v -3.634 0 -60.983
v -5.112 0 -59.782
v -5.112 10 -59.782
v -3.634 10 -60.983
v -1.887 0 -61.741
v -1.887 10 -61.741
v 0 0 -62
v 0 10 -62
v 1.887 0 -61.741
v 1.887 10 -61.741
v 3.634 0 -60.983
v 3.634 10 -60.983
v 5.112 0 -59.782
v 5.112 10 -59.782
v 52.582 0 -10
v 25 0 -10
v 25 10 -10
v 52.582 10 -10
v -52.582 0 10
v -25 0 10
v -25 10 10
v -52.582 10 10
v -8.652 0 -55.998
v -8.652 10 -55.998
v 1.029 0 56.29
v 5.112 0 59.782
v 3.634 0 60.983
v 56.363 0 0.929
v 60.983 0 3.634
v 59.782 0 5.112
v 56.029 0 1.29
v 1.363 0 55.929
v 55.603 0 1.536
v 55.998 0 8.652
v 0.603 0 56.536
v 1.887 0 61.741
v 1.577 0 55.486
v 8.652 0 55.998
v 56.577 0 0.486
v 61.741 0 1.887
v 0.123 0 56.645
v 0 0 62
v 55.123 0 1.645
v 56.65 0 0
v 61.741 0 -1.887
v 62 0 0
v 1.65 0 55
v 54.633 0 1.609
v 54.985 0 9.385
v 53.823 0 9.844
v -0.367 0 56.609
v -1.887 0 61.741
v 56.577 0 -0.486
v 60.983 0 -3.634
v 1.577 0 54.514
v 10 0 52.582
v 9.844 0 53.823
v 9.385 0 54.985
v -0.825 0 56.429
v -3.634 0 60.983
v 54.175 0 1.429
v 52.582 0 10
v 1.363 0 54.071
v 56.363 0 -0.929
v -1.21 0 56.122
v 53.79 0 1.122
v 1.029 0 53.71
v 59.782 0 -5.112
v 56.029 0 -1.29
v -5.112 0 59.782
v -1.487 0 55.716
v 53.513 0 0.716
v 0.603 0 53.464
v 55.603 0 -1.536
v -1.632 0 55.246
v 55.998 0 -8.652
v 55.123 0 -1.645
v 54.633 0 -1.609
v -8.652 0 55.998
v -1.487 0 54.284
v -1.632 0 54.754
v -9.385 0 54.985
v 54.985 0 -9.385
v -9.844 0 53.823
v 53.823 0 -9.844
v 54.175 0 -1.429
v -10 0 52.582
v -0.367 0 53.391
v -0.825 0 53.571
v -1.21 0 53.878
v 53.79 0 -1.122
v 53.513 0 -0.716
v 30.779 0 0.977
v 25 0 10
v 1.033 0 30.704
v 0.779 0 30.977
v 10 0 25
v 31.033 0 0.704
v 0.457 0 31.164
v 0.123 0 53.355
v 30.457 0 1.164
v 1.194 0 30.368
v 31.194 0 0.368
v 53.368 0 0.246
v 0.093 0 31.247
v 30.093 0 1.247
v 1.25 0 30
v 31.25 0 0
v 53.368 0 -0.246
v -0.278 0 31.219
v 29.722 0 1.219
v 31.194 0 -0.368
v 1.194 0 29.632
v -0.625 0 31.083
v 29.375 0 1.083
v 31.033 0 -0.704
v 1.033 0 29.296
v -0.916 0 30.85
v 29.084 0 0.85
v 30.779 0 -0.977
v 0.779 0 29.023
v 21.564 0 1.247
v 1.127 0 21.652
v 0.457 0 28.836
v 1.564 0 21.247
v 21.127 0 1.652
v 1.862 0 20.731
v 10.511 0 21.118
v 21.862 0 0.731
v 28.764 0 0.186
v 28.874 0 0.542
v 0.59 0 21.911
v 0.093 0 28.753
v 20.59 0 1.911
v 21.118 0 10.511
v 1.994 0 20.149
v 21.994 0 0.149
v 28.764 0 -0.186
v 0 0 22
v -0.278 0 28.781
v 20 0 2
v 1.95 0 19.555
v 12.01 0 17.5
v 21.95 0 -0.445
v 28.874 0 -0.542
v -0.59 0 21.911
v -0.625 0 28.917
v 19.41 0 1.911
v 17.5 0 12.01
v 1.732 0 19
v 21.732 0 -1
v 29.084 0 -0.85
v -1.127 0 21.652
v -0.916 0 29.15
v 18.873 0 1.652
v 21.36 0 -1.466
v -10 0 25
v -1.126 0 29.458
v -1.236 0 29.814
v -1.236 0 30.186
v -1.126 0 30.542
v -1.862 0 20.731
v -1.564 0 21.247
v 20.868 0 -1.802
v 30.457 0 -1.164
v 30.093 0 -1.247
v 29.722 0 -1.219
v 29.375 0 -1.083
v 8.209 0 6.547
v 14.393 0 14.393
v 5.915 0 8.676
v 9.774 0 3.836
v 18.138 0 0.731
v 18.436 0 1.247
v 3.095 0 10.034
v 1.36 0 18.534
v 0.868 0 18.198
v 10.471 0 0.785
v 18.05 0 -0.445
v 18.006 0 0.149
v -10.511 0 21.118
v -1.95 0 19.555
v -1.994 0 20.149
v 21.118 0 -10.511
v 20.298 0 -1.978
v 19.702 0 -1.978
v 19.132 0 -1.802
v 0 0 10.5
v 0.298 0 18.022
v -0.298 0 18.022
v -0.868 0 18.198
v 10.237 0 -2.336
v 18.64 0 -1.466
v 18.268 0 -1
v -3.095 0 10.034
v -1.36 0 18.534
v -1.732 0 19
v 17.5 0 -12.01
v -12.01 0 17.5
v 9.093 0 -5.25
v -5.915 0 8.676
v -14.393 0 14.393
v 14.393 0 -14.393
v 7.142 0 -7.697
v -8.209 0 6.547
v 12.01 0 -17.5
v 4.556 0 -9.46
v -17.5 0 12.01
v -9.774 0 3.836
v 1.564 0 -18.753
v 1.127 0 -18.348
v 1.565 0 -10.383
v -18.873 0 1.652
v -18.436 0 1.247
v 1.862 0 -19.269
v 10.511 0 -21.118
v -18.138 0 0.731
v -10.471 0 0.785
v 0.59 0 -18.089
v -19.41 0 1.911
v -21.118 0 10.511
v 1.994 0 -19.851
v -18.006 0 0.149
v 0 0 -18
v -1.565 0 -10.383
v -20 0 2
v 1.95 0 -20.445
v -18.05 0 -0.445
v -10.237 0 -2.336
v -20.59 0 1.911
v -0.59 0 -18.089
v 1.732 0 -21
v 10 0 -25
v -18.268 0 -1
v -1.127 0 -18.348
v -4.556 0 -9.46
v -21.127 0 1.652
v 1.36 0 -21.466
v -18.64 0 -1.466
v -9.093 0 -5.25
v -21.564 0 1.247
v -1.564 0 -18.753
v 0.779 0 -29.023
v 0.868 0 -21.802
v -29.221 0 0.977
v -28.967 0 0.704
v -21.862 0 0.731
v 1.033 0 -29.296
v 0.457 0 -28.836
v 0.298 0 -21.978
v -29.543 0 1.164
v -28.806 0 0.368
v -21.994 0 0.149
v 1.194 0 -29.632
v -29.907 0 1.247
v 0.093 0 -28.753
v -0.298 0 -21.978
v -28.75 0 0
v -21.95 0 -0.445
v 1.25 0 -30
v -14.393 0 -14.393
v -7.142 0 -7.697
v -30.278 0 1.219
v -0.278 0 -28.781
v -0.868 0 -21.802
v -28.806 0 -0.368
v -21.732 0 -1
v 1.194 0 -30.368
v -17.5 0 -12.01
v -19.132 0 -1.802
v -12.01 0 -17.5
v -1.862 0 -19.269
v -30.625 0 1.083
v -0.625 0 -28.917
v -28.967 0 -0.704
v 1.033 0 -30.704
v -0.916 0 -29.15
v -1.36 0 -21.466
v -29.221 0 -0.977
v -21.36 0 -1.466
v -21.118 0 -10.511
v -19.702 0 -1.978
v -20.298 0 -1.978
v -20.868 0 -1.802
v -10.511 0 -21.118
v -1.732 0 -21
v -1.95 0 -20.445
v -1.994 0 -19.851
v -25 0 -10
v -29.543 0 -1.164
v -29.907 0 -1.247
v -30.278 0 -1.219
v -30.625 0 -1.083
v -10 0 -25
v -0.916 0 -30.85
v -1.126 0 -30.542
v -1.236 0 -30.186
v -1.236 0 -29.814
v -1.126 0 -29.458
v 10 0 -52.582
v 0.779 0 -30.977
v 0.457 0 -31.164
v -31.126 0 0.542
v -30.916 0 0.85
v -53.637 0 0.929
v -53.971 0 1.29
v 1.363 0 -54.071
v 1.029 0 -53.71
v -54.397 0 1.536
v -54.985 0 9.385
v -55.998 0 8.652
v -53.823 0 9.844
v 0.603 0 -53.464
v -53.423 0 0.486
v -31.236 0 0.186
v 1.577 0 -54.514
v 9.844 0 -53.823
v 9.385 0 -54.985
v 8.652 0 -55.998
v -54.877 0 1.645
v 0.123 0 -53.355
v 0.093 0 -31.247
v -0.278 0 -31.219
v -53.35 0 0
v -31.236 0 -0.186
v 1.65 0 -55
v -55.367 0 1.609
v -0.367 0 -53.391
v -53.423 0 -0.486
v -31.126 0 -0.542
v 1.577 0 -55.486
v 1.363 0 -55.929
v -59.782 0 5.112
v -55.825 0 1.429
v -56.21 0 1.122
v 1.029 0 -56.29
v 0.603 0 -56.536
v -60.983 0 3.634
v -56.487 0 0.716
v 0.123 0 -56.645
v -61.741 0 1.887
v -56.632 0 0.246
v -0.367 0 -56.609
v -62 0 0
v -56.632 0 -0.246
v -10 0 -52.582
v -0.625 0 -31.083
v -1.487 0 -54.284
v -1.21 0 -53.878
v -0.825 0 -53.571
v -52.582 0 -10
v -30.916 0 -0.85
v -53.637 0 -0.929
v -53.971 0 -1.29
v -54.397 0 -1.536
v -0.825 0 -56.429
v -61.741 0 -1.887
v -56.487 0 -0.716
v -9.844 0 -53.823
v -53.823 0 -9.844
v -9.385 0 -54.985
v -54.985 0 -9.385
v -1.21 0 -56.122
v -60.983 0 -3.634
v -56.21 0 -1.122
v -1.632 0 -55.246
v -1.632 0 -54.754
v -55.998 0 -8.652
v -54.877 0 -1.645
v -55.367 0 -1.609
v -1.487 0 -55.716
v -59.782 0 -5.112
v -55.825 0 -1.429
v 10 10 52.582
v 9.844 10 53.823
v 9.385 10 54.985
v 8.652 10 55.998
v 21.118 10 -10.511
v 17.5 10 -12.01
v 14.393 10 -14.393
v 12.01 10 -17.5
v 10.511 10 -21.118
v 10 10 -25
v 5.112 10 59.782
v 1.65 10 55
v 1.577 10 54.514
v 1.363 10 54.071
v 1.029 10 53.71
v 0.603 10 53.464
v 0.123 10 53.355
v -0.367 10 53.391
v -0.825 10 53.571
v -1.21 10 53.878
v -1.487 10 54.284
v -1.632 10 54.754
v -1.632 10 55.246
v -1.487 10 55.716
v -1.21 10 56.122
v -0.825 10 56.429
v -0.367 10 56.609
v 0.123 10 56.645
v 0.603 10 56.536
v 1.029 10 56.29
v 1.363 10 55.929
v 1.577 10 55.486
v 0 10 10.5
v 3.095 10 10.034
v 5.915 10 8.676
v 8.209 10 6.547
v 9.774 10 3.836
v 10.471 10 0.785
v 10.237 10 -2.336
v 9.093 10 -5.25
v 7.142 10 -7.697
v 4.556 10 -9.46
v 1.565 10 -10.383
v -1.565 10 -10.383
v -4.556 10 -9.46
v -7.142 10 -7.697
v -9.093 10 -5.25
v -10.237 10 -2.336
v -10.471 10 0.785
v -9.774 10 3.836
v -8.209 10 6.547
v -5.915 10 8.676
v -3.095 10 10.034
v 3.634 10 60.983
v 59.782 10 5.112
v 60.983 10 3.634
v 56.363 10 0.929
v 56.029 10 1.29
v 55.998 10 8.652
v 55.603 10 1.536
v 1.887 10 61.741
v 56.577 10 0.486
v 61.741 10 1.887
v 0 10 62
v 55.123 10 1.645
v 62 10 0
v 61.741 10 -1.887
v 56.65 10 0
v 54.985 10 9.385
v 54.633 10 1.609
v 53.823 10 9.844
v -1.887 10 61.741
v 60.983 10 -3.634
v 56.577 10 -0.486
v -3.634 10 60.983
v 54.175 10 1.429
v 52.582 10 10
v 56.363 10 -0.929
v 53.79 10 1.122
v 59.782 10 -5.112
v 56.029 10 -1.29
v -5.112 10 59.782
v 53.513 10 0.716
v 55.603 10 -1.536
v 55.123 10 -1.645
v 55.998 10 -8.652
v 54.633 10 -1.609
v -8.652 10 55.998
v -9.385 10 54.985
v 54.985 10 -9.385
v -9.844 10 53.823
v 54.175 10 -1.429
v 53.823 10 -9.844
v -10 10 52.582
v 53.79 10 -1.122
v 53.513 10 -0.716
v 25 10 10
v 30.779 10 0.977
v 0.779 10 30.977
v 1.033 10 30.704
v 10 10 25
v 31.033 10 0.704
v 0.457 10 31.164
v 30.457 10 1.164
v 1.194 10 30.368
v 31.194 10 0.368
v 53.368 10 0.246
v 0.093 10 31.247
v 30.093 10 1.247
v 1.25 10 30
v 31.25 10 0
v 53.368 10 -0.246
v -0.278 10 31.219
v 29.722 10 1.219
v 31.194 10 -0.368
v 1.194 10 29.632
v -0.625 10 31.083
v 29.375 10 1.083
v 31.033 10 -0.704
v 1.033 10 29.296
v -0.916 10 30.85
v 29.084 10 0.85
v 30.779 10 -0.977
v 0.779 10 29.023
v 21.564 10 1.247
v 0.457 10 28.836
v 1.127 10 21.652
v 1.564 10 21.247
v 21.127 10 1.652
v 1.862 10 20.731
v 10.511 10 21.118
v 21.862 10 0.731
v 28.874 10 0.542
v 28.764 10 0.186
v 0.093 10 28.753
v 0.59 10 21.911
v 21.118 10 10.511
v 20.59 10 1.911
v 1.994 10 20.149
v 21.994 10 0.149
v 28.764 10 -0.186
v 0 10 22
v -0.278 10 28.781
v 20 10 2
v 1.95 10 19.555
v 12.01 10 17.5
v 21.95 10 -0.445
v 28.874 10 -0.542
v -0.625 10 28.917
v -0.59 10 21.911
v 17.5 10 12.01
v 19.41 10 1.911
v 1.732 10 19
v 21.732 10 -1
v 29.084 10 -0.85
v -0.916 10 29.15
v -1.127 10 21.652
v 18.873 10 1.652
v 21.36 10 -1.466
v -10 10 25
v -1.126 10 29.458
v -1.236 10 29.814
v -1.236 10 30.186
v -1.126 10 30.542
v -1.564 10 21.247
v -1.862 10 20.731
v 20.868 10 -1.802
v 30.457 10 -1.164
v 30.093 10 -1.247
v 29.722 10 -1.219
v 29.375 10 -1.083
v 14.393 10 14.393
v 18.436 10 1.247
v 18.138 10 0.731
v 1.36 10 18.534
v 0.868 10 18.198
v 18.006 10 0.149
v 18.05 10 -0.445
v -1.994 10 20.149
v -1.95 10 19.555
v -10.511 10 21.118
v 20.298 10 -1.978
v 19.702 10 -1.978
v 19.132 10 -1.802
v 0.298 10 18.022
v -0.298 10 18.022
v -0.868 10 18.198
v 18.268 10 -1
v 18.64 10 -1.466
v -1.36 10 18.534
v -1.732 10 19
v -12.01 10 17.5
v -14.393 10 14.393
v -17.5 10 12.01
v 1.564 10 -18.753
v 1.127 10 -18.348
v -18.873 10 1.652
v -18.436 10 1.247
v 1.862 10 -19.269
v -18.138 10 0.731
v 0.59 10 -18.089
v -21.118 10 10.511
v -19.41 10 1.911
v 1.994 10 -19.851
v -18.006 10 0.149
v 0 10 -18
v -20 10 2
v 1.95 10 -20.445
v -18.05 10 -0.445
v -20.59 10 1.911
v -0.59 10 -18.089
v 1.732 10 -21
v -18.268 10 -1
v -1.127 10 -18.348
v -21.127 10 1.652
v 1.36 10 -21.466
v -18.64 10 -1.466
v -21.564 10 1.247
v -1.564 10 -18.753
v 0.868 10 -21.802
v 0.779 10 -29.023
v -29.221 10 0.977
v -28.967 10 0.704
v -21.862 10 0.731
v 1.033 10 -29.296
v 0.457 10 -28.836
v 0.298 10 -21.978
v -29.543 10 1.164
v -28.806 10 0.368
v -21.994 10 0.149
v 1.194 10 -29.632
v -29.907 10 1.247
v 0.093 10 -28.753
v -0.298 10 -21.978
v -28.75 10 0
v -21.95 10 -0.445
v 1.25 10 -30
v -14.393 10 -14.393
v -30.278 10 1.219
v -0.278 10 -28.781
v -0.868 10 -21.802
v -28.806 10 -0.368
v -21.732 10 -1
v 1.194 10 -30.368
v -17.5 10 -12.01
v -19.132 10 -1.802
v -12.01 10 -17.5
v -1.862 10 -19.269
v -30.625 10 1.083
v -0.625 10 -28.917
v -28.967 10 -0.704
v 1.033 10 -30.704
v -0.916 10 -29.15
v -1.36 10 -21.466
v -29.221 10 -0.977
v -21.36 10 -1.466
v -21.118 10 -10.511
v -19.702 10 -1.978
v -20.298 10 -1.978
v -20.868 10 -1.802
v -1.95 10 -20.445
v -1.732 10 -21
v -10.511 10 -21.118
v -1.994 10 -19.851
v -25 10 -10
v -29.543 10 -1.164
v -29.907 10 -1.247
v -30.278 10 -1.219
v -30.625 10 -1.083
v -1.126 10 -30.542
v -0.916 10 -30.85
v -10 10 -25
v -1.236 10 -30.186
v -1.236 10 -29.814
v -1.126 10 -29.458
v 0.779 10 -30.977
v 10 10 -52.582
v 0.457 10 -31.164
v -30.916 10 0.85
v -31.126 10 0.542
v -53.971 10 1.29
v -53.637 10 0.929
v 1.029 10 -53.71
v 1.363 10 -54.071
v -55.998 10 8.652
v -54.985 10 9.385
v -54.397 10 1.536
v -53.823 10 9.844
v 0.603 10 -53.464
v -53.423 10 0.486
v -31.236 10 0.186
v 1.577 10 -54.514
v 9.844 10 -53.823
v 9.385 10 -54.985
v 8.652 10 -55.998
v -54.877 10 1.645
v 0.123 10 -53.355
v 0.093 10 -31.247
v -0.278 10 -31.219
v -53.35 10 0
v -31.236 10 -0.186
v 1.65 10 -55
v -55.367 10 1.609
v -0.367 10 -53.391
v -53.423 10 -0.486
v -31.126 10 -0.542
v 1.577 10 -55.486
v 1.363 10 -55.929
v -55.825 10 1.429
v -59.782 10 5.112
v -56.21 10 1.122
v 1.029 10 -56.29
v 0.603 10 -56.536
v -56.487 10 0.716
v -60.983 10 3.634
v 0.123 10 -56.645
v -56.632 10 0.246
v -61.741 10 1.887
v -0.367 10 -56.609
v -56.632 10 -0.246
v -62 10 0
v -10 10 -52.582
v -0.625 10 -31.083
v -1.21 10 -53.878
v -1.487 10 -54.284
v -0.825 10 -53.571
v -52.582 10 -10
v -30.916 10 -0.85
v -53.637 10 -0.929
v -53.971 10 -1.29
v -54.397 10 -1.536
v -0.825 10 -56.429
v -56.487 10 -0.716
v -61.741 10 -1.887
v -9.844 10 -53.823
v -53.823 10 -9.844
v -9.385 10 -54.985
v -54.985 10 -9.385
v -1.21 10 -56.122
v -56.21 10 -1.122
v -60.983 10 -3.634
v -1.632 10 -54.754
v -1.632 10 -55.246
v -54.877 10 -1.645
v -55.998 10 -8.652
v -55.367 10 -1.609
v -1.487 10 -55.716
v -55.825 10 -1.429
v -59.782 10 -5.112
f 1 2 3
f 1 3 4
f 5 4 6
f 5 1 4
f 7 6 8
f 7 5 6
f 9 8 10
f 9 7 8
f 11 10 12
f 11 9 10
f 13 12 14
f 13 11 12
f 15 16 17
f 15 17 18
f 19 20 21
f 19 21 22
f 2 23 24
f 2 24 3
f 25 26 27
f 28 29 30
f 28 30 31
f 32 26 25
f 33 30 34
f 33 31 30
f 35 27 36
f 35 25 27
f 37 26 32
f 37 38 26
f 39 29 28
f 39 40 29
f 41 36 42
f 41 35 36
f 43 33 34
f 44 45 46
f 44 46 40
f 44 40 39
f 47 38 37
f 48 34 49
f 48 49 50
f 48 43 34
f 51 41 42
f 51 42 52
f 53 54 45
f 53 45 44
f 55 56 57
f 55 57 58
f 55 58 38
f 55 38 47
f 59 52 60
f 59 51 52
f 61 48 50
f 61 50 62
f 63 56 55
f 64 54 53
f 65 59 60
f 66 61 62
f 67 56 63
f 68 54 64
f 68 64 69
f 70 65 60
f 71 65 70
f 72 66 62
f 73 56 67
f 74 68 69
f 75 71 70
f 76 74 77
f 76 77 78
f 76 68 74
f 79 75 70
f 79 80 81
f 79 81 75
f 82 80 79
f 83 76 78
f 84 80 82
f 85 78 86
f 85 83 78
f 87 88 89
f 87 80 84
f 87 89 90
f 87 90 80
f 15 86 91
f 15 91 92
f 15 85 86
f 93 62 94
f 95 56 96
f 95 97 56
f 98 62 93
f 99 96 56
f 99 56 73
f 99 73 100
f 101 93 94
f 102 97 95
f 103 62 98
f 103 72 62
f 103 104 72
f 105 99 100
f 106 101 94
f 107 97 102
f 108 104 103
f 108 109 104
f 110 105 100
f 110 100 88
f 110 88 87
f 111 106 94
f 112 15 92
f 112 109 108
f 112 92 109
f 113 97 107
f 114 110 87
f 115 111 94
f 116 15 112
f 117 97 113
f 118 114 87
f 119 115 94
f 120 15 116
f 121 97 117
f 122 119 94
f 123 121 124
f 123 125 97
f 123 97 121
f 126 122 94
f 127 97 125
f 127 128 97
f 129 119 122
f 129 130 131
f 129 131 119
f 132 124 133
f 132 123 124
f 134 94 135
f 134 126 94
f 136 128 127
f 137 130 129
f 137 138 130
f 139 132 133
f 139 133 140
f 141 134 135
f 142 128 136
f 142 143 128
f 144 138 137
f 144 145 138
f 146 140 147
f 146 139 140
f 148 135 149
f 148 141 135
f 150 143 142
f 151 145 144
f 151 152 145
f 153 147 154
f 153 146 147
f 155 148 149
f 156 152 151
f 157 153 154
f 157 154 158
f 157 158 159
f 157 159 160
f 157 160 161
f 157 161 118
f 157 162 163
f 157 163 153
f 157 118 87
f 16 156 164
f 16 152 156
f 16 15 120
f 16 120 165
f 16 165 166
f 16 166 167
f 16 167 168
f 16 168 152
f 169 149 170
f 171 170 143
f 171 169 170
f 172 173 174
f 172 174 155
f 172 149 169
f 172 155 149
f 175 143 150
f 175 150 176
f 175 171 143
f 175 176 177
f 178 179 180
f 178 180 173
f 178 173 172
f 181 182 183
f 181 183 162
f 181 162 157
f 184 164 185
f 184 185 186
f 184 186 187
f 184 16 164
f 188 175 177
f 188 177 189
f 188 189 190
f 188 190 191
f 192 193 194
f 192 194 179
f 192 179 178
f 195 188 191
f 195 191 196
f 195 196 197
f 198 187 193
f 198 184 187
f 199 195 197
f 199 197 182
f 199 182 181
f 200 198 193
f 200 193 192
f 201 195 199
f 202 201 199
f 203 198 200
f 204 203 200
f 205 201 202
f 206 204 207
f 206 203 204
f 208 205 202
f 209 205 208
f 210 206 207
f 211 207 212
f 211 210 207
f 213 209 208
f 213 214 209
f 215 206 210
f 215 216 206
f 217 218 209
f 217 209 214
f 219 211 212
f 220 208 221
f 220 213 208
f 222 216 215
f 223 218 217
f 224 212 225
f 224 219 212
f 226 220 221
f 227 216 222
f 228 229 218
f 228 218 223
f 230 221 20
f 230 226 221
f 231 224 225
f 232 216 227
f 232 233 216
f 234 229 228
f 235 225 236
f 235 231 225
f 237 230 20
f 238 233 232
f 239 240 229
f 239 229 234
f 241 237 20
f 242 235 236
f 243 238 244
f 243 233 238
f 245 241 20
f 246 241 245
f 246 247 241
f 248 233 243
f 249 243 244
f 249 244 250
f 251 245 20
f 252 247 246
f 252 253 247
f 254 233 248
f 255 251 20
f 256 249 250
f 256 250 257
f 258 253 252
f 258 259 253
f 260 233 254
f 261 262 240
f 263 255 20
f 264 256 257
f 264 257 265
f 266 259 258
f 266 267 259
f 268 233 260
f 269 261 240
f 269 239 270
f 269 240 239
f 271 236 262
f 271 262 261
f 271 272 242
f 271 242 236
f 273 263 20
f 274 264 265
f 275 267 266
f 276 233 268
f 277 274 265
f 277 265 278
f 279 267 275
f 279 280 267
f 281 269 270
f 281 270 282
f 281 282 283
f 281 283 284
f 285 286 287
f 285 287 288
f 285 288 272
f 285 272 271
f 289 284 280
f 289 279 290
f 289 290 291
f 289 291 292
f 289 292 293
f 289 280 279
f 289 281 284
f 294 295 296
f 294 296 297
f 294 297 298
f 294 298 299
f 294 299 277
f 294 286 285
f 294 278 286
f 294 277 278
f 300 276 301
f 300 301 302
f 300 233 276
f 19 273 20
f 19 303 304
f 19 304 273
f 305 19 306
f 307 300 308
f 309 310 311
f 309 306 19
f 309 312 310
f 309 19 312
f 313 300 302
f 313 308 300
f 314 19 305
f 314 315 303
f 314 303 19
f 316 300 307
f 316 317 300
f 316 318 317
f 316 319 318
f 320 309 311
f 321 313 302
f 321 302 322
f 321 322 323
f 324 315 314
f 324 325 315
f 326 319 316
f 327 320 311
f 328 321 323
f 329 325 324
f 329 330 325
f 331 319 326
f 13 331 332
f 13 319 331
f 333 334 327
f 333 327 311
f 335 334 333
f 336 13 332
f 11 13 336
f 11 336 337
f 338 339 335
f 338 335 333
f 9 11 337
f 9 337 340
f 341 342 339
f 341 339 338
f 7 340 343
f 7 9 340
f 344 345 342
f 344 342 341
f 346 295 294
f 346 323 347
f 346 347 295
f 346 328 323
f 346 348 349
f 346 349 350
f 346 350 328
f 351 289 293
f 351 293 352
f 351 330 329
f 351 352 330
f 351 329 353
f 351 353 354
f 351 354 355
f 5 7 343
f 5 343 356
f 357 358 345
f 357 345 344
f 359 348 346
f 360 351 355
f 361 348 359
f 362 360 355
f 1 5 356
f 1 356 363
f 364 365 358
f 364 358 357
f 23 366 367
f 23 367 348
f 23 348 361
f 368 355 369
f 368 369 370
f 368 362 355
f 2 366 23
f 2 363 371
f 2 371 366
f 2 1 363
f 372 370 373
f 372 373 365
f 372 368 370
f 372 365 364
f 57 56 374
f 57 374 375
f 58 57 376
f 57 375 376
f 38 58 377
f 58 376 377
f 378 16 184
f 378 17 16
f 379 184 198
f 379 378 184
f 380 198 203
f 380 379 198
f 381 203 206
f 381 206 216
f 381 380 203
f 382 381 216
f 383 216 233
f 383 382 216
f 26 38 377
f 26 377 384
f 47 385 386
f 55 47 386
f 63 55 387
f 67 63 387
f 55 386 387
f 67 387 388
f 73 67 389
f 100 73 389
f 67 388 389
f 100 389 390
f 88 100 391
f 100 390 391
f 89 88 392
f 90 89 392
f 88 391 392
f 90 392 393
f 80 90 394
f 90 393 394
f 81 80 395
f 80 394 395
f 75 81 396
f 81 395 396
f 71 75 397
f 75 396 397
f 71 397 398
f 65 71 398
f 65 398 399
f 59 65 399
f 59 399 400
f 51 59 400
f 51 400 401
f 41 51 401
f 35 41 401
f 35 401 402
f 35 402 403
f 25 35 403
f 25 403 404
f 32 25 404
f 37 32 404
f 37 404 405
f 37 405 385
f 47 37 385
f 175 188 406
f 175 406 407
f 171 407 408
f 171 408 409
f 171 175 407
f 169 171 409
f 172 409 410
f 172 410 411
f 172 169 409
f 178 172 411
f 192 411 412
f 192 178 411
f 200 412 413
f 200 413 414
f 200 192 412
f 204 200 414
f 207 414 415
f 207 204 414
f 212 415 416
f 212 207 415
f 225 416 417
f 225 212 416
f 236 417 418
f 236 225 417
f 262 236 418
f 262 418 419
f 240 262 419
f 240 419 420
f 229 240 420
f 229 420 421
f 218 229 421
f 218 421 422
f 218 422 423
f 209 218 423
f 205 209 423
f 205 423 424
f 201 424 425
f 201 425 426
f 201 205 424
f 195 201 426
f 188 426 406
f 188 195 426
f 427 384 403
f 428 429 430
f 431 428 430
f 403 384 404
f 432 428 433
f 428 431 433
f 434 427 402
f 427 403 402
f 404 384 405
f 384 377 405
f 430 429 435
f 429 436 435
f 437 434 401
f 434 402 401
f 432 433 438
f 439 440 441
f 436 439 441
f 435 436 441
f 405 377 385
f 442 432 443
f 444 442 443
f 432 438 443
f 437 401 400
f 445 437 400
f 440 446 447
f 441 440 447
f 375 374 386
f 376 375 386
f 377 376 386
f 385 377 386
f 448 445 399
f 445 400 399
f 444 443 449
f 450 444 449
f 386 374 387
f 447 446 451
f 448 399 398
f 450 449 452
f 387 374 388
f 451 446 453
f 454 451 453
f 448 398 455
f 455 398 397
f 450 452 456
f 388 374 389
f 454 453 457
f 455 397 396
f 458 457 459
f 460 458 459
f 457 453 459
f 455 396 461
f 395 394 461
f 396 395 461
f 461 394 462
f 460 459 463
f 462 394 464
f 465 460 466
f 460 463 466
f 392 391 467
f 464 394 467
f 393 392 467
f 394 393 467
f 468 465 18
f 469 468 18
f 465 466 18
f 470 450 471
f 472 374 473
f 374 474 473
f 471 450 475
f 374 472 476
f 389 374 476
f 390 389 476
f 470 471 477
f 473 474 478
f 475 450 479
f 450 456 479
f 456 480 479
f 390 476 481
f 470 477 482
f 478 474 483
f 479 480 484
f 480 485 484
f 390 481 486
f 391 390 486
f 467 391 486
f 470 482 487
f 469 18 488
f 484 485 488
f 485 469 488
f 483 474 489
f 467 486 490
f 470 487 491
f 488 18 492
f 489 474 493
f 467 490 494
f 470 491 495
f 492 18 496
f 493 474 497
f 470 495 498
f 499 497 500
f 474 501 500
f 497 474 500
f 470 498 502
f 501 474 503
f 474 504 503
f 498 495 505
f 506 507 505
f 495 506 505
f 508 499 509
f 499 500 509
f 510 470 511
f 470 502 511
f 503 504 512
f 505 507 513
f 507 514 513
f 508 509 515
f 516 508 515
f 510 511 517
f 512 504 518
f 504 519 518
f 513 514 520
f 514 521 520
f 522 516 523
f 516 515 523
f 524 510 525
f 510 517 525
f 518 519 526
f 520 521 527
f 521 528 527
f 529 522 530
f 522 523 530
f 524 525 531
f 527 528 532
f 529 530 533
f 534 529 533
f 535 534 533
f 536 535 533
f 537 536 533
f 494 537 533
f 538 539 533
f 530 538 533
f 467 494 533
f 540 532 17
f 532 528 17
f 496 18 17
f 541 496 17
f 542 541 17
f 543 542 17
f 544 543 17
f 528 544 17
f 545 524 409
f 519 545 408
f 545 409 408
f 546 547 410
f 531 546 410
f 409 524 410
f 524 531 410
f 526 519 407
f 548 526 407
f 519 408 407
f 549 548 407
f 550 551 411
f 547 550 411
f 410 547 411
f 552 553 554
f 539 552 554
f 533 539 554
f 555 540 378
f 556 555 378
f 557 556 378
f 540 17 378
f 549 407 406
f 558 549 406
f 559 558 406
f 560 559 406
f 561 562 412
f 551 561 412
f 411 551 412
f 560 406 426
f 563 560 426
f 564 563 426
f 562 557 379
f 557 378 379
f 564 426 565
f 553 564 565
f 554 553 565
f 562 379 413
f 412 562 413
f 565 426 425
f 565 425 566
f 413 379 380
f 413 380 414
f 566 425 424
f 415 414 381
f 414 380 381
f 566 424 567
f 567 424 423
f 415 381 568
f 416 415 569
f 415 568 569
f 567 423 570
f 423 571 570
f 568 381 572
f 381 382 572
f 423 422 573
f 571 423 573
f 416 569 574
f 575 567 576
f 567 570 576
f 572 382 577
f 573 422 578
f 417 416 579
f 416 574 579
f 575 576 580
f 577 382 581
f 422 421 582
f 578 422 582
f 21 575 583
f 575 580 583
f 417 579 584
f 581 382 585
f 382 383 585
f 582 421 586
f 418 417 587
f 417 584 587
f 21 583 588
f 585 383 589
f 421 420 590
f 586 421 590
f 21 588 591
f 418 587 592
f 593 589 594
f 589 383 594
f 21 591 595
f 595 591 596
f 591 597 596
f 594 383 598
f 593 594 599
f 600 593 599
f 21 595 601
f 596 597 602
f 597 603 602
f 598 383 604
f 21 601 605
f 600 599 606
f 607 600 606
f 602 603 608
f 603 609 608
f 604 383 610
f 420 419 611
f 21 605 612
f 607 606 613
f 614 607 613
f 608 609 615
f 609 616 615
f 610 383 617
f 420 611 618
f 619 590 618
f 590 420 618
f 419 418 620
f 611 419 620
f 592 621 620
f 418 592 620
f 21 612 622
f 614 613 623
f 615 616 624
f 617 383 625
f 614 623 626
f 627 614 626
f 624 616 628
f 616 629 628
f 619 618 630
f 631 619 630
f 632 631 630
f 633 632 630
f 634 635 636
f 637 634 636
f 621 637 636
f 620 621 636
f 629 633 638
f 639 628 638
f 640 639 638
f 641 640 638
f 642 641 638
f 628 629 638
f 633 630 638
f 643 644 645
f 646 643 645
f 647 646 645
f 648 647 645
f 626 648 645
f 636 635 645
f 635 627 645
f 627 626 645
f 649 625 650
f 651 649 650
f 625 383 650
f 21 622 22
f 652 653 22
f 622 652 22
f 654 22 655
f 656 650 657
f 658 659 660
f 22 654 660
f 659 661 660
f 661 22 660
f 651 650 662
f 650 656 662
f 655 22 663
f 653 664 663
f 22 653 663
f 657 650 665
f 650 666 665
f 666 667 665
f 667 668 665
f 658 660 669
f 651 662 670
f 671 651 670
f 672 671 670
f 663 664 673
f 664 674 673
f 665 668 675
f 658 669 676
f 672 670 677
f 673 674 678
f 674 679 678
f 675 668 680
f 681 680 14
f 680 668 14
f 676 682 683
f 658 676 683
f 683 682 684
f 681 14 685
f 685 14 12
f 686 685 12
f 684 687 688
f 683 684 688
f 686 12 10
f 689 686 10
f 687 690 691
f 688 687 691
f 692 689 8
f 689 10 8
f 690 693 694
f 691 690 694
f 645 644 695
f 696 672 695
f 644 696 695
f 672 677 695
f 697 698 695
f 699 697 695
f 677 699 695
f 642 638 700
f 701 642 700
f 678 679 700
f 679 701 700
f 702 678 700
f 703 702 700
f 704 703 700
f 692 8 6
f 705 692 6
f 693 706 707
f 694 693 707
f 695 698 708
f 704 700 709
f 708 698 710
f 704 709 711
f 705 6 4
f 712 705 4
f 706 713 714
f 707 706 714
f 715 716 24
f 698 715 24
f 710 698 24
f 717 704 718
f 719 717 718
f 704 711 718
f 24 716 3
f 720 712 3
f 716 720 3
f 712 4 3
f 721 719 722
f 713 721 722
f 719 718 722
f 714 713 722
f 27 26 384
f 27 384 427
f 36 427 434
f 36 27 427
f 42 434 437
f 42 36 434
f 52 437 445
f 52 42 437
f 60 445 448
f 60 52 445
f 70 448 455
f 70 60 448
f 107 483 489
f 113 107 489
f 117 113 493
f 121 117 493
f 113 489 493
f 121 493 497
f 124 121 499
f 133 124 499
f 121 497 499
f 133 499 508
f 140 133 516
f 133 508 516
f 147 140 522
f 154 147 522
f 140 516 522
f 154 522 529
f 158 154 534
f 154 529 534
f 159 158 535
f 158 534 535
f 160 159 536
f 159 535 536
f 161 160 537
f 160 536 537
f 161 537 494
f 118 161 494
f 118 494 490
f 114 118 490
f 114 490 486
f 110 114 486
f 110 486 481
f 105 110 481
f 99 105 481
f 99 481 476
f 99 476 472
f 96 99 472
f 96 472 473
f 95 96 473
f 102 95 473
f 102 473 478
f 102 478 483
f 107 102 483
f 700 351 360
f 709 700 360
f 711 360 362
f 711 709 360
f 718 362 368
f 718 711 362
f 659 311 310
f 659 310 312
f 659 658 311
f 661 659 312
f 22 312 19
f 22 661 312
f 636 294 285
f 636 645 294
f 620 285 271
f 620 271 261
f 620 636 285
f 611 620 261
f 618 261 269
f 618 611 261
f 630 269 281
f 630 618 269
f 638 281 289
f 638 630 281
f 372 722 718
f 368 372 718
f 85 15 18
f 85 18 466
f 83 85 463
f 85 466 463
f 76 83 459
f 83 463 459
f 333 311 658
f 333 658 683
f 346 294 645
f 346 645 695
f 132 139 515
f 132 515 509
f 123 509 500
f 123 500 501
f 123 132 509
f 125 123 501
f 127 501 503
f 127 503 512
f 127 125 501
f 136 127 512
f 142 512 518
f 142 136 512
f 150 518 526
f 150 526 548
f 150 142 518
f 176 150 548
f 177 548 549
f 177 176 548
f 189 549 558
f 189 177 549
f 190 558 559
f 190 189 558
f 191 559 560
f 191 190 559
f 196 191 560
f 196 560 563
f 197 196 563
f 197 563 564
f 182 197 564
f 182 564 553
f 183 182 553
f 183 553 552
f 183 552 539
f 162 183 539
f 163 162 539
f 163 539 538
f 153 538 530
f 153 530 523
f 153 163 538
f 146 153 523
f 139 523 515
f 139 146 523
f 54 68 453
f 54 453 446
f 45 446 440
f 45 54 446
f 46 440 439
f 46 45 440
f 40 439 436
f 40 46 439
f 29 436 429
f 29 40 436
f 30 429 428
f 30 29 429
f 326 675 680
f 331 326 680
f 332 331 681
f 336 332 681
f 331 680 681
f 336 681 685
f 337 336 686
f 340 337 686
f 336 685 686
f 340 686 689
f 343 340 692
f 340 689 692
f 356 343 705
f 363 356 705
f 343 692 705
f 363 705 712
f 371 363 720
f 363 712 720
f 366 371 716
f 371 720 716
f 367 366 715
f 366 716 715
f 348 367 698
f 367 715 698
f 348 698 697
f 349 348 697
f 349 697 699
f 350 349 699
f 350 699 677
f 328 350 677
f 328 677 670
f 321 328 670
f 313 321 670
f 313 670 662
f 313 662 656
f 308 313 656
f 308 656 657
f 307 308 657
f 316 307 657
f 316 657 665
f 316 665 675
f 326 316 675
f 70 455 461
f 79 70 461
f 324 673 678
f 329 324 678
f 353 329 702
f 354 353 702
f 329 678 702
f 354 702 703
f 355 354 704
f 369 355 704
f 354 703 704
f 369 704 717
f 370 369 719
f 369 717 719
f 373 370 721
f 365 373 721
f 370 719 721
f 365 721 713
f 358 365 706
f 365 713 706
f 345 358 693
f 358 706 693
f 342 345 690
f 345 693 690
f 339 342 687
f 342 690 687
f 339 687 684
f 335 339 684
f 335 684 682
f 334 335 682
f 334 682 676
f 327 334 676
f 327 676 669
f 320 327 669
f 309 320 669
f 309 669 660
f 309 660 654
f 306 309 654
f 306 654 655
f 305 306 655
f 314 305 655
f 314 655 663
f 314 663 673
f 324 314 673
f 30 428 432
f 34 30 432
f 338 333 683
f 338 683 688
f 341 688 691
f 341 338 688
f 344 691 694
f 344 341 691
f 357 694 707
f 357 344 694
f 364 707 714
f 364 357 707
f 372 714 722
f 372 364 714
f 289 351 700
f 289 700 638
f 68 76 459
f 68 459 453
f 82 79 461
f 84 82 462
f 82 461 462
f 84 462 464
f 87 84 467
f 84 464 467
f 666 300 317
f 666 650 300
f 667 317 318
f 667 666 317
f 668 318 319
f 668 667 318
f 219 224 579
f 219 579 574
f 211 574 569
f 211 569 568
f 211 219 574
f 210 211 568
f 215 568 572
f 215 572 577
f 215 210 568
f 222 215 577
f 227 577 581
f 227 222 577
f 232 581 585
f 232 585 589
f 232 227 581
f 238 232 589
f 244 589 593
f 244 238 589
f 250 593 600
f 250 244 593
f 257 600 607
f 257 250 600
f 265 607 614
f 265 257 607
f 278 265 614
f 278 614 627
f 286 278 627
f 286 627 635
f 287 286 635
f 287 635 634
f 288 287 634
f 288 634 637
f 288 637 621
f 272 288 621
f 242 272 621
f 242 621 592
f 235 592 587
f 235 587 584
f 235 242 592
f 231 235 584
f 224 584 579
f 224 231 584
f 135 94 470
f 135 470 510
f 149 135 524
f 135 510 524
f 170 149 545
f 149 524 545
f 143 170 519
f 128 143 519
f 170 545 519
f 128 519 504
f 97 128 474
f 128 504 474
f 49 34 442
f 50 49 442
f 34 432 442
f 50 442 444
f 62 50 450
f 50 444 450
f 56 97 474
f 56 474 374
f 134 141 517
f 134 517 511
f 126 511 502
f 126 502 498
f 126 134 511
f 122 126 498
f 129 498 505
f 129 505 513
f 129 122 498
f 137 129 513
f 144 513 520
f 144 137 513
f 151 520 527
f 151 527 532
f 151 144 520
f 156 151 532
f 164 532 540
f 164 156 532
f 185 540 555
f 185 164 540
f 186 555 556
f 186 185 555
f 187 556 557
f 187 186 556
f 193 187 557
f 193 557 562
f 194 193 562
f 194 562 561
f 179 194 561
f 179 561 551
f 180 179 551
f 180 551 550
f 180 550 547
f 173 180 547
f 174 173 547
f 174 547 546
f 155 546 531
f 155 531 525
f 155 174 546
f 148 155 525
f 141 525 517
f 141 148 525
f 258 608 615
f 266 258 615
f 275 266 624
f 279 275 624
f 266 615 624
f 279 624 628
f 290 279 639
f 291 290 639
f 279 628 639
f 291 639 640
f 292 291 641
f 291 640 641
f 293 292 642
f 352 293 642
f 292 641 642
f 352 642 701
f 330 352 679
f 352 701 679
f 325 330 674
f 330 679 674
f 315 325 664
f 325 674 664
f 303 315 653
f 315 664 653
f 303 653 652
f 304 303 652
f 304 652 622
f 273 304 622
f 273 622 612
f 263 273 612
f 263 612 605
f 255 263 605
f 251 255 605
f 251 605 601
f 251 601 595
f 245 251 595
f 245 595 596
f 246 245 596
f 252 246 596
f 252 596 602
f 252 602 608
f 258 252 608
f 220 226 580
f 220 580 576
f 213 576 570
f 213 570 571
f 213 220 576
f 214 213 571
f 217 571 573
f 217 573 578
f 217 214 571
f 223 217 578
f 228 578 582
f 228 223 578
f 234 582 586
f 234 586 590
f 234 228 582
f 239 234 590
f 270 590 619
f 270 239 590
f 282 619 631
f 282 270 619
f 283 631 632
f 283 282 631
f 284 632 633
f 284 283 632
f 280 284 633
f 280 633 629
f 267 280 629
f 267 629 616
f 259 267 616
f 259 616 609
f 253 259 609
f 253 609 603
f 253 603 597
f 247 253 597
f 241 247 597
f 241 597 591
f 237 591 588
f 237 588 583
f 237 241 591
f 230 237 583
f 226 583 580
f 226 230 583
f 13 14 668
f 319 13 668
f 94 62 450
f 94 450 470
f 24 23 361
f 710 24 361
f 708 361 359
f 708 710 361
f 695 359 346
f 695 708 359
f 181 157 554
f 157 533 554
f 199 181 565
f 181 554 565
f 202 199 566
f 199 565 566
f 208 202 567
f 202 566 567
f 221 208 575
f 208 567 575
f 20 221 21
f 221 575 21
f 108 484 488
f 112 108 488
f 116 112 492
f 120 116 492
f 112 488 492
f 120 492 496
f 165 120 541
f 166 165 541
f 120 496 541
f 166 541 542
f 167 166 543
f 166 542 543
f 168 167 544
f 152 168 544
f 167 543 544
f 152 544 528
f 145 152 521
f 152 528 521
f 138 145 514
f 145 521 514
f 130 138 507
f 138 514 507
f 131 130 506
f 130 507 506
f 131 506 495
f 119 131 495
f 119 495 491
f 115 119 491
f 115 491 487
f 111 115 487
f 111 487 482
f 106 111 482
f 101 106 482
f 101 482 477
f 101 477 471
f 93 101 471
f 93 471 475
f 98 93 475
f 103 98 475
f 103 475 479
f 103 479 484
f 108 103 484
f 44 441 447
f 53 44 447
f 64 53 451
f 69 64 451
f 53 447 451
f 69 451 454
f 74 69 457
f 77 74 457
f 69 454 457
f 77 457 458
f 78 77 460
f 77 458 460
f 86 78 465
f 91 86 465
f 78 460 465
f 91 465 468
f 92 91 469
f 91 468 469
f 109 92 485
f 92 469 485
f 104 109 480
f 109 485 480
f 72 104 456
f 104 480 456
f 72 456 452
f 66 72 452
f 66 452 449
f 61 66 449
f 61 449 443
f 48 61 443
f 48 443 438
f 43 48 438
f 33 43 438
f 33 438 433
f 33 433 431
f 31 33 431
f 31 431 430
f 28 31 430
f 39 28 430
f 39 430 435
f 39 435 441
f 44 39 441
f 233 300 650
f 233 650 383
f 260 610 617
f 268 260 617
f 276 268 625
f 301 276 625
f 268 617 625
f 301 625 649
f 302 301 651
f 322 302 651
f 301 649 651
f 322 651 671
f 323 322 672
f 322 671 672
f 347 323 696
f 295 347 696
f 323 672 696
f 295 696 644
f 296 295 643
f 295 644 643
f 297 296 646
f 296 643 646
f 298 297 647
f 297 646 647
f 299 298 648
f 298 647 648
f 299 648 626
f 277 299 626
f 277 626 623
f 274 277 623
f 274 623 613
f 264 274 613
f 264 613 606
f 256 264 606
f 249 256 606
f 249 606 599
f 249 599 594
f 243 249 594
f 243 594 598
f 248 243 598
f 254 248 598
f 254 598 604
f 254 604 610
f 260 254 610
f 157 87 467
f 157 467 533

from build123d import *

# Parameters (mm, degrees)
SKETCH1_R             = 2
SKETCH1_R_2           = 10.5
BOSS_EXTRUDE1_DEPTH   = 10
FILLET1_R             = 15
FILLET2_R             = 5
M4X0_7_TAPPED_HOLE1_D = 3.3
M3X0_5_TAPPED_HOLE1_D = 2.5


with BuildPart() as part:
    # Sketch1 → Boss-Extrude1 (new body)
    with BuildSketch(Plane(origin=(0, 0, 0), x_dir=(1, 0, 0), z_dir=(0, 1, 0))):
        with BuildLine():
            Line((10, 10), (54.556312231, 10))
            Line((54.556312231, 10), (59.781818182, 5.112163424))
            ThreePointArc((59.781818182, 5.112163424), (62, 0), (59.781818182, -5.112163424))
            Line((59.781818182, -5.112163424), (54.556312231, -10))
            Line((54.556312231, -10), (10, -10))
            Line((10, -10), (10, -54.556312231))
            Line((10, -54.556312231), (5.112163424, -59.781818182))
            ThreePointArc((5.112163424, -59.781818182), (0, -62), (-5.112163424, -59.781818182))
            Line((-5.112163424, -59.781818182), (-10, -54.556312231))
            Line((-10, -54.556312231), (-10, -10))
            Line((-10, -10), (-54.556312231, -10))
            Line((-54.556312231, -10), (-59.781818182, -5.112163424))
            ThreePointArc((-59.781818182, -5.112163424), (-62, 0), (-59.781818182, 5.112163424))
            Line((-59.781818182, 5.112163424), (-54.556312231, 10))
            Line((-54.556312231, 10), (-10, 10))
            Line((-10, 10), (-10, 54.556312231))
            Line((-10, 54.556312231), (-5.112163424, 59.781818182))
            ThreePointArc((-5.112163424, 59.781818182), (0, 62), (5.112163424, 59.781818182))
            Line((5.112163424, 59.781818182), (10, 54.556312231))
            Line((10, 54.556312231), (10, 10))
        make_face()
        with Locations(Location((-20, 0, 0), (0, 0, 270))):
            Circle(SKETCH1_R, mode=Mode.SUBTRACT)
        with Locations(Location((0, 20, 0), (0, 0, 270))):
            Circle(SKETCH1_R, mode=Mode.SUBTRACT)
        with Locations(Location((20, 0, 0), (0, 0, 270))):
            Circle(SKETCH1_R, mode=Mode.SUBTRACT)
        with Locations(Location((0, -20, 0), (0, 0, 270))):
            Circle(SKETCH1_R, mode=Mode.SUBTRACT)
        with Locations(Location((0, 0, 0), (0, 0, 270))):
            Circle(SKETCH1_R_2, mode=Mode.SUBTRACT)
    extrude(amount=BOSS_EXTRUDE1_DEPTH)

    # Fillet1
    fillet1_edges = [part.edges().sort_by_distance(p)[0] for p in [
        (10, 5, -10),
        (10, 5, 10),
        (-10, 5, 10),
        (-10, 5, -10),
    ]]
    fillet(fillet1_edges, radius=FILLET1_R)

    # Fillet2
    fillet2_edges = [part.edges().sort_by_distance(p)[0] for p in [
        (54.556312231, 5, -10),
        (54.556312231, 5, 10),
        (10, 5, 54.556312231),
        (-10, 5, 54.556312231),
        (-54.556312231, 5, 10),
        (-54.556312231, 5, -10),
        (-10, 5, -54.556312231),
        (10, 5, -54.556312231),
    ]]
    fillet(fillet2_edges, radius=FILLET2_R)

    # M4x0.7 Tapped Hole1 (through all)
    with Locations(Plane(origin=(0, 0, 0), x_dir=(-1, 0, 0), z_dir=(0, -1, 0))):
        with Locations((0, -55), (-55, 0), (0, 55), (55, 0)):
            Hole(M4X0_7_TAPPED_HOLE1_D / 2)

    # M3x0.5 Tapped Hole1 (through all)
    with Locations(Plane(origin=(0, 0, 0), x_dir=(-1, 0, 0), z_dir=(0, -1, 0))):
        with Locations((0, -30), (-30, 0), (0, 30), (30, 0), (0, 0)):
            Hole(M3X0_5_TAPPED_HOLE1_D / 2)


solid = part.part
